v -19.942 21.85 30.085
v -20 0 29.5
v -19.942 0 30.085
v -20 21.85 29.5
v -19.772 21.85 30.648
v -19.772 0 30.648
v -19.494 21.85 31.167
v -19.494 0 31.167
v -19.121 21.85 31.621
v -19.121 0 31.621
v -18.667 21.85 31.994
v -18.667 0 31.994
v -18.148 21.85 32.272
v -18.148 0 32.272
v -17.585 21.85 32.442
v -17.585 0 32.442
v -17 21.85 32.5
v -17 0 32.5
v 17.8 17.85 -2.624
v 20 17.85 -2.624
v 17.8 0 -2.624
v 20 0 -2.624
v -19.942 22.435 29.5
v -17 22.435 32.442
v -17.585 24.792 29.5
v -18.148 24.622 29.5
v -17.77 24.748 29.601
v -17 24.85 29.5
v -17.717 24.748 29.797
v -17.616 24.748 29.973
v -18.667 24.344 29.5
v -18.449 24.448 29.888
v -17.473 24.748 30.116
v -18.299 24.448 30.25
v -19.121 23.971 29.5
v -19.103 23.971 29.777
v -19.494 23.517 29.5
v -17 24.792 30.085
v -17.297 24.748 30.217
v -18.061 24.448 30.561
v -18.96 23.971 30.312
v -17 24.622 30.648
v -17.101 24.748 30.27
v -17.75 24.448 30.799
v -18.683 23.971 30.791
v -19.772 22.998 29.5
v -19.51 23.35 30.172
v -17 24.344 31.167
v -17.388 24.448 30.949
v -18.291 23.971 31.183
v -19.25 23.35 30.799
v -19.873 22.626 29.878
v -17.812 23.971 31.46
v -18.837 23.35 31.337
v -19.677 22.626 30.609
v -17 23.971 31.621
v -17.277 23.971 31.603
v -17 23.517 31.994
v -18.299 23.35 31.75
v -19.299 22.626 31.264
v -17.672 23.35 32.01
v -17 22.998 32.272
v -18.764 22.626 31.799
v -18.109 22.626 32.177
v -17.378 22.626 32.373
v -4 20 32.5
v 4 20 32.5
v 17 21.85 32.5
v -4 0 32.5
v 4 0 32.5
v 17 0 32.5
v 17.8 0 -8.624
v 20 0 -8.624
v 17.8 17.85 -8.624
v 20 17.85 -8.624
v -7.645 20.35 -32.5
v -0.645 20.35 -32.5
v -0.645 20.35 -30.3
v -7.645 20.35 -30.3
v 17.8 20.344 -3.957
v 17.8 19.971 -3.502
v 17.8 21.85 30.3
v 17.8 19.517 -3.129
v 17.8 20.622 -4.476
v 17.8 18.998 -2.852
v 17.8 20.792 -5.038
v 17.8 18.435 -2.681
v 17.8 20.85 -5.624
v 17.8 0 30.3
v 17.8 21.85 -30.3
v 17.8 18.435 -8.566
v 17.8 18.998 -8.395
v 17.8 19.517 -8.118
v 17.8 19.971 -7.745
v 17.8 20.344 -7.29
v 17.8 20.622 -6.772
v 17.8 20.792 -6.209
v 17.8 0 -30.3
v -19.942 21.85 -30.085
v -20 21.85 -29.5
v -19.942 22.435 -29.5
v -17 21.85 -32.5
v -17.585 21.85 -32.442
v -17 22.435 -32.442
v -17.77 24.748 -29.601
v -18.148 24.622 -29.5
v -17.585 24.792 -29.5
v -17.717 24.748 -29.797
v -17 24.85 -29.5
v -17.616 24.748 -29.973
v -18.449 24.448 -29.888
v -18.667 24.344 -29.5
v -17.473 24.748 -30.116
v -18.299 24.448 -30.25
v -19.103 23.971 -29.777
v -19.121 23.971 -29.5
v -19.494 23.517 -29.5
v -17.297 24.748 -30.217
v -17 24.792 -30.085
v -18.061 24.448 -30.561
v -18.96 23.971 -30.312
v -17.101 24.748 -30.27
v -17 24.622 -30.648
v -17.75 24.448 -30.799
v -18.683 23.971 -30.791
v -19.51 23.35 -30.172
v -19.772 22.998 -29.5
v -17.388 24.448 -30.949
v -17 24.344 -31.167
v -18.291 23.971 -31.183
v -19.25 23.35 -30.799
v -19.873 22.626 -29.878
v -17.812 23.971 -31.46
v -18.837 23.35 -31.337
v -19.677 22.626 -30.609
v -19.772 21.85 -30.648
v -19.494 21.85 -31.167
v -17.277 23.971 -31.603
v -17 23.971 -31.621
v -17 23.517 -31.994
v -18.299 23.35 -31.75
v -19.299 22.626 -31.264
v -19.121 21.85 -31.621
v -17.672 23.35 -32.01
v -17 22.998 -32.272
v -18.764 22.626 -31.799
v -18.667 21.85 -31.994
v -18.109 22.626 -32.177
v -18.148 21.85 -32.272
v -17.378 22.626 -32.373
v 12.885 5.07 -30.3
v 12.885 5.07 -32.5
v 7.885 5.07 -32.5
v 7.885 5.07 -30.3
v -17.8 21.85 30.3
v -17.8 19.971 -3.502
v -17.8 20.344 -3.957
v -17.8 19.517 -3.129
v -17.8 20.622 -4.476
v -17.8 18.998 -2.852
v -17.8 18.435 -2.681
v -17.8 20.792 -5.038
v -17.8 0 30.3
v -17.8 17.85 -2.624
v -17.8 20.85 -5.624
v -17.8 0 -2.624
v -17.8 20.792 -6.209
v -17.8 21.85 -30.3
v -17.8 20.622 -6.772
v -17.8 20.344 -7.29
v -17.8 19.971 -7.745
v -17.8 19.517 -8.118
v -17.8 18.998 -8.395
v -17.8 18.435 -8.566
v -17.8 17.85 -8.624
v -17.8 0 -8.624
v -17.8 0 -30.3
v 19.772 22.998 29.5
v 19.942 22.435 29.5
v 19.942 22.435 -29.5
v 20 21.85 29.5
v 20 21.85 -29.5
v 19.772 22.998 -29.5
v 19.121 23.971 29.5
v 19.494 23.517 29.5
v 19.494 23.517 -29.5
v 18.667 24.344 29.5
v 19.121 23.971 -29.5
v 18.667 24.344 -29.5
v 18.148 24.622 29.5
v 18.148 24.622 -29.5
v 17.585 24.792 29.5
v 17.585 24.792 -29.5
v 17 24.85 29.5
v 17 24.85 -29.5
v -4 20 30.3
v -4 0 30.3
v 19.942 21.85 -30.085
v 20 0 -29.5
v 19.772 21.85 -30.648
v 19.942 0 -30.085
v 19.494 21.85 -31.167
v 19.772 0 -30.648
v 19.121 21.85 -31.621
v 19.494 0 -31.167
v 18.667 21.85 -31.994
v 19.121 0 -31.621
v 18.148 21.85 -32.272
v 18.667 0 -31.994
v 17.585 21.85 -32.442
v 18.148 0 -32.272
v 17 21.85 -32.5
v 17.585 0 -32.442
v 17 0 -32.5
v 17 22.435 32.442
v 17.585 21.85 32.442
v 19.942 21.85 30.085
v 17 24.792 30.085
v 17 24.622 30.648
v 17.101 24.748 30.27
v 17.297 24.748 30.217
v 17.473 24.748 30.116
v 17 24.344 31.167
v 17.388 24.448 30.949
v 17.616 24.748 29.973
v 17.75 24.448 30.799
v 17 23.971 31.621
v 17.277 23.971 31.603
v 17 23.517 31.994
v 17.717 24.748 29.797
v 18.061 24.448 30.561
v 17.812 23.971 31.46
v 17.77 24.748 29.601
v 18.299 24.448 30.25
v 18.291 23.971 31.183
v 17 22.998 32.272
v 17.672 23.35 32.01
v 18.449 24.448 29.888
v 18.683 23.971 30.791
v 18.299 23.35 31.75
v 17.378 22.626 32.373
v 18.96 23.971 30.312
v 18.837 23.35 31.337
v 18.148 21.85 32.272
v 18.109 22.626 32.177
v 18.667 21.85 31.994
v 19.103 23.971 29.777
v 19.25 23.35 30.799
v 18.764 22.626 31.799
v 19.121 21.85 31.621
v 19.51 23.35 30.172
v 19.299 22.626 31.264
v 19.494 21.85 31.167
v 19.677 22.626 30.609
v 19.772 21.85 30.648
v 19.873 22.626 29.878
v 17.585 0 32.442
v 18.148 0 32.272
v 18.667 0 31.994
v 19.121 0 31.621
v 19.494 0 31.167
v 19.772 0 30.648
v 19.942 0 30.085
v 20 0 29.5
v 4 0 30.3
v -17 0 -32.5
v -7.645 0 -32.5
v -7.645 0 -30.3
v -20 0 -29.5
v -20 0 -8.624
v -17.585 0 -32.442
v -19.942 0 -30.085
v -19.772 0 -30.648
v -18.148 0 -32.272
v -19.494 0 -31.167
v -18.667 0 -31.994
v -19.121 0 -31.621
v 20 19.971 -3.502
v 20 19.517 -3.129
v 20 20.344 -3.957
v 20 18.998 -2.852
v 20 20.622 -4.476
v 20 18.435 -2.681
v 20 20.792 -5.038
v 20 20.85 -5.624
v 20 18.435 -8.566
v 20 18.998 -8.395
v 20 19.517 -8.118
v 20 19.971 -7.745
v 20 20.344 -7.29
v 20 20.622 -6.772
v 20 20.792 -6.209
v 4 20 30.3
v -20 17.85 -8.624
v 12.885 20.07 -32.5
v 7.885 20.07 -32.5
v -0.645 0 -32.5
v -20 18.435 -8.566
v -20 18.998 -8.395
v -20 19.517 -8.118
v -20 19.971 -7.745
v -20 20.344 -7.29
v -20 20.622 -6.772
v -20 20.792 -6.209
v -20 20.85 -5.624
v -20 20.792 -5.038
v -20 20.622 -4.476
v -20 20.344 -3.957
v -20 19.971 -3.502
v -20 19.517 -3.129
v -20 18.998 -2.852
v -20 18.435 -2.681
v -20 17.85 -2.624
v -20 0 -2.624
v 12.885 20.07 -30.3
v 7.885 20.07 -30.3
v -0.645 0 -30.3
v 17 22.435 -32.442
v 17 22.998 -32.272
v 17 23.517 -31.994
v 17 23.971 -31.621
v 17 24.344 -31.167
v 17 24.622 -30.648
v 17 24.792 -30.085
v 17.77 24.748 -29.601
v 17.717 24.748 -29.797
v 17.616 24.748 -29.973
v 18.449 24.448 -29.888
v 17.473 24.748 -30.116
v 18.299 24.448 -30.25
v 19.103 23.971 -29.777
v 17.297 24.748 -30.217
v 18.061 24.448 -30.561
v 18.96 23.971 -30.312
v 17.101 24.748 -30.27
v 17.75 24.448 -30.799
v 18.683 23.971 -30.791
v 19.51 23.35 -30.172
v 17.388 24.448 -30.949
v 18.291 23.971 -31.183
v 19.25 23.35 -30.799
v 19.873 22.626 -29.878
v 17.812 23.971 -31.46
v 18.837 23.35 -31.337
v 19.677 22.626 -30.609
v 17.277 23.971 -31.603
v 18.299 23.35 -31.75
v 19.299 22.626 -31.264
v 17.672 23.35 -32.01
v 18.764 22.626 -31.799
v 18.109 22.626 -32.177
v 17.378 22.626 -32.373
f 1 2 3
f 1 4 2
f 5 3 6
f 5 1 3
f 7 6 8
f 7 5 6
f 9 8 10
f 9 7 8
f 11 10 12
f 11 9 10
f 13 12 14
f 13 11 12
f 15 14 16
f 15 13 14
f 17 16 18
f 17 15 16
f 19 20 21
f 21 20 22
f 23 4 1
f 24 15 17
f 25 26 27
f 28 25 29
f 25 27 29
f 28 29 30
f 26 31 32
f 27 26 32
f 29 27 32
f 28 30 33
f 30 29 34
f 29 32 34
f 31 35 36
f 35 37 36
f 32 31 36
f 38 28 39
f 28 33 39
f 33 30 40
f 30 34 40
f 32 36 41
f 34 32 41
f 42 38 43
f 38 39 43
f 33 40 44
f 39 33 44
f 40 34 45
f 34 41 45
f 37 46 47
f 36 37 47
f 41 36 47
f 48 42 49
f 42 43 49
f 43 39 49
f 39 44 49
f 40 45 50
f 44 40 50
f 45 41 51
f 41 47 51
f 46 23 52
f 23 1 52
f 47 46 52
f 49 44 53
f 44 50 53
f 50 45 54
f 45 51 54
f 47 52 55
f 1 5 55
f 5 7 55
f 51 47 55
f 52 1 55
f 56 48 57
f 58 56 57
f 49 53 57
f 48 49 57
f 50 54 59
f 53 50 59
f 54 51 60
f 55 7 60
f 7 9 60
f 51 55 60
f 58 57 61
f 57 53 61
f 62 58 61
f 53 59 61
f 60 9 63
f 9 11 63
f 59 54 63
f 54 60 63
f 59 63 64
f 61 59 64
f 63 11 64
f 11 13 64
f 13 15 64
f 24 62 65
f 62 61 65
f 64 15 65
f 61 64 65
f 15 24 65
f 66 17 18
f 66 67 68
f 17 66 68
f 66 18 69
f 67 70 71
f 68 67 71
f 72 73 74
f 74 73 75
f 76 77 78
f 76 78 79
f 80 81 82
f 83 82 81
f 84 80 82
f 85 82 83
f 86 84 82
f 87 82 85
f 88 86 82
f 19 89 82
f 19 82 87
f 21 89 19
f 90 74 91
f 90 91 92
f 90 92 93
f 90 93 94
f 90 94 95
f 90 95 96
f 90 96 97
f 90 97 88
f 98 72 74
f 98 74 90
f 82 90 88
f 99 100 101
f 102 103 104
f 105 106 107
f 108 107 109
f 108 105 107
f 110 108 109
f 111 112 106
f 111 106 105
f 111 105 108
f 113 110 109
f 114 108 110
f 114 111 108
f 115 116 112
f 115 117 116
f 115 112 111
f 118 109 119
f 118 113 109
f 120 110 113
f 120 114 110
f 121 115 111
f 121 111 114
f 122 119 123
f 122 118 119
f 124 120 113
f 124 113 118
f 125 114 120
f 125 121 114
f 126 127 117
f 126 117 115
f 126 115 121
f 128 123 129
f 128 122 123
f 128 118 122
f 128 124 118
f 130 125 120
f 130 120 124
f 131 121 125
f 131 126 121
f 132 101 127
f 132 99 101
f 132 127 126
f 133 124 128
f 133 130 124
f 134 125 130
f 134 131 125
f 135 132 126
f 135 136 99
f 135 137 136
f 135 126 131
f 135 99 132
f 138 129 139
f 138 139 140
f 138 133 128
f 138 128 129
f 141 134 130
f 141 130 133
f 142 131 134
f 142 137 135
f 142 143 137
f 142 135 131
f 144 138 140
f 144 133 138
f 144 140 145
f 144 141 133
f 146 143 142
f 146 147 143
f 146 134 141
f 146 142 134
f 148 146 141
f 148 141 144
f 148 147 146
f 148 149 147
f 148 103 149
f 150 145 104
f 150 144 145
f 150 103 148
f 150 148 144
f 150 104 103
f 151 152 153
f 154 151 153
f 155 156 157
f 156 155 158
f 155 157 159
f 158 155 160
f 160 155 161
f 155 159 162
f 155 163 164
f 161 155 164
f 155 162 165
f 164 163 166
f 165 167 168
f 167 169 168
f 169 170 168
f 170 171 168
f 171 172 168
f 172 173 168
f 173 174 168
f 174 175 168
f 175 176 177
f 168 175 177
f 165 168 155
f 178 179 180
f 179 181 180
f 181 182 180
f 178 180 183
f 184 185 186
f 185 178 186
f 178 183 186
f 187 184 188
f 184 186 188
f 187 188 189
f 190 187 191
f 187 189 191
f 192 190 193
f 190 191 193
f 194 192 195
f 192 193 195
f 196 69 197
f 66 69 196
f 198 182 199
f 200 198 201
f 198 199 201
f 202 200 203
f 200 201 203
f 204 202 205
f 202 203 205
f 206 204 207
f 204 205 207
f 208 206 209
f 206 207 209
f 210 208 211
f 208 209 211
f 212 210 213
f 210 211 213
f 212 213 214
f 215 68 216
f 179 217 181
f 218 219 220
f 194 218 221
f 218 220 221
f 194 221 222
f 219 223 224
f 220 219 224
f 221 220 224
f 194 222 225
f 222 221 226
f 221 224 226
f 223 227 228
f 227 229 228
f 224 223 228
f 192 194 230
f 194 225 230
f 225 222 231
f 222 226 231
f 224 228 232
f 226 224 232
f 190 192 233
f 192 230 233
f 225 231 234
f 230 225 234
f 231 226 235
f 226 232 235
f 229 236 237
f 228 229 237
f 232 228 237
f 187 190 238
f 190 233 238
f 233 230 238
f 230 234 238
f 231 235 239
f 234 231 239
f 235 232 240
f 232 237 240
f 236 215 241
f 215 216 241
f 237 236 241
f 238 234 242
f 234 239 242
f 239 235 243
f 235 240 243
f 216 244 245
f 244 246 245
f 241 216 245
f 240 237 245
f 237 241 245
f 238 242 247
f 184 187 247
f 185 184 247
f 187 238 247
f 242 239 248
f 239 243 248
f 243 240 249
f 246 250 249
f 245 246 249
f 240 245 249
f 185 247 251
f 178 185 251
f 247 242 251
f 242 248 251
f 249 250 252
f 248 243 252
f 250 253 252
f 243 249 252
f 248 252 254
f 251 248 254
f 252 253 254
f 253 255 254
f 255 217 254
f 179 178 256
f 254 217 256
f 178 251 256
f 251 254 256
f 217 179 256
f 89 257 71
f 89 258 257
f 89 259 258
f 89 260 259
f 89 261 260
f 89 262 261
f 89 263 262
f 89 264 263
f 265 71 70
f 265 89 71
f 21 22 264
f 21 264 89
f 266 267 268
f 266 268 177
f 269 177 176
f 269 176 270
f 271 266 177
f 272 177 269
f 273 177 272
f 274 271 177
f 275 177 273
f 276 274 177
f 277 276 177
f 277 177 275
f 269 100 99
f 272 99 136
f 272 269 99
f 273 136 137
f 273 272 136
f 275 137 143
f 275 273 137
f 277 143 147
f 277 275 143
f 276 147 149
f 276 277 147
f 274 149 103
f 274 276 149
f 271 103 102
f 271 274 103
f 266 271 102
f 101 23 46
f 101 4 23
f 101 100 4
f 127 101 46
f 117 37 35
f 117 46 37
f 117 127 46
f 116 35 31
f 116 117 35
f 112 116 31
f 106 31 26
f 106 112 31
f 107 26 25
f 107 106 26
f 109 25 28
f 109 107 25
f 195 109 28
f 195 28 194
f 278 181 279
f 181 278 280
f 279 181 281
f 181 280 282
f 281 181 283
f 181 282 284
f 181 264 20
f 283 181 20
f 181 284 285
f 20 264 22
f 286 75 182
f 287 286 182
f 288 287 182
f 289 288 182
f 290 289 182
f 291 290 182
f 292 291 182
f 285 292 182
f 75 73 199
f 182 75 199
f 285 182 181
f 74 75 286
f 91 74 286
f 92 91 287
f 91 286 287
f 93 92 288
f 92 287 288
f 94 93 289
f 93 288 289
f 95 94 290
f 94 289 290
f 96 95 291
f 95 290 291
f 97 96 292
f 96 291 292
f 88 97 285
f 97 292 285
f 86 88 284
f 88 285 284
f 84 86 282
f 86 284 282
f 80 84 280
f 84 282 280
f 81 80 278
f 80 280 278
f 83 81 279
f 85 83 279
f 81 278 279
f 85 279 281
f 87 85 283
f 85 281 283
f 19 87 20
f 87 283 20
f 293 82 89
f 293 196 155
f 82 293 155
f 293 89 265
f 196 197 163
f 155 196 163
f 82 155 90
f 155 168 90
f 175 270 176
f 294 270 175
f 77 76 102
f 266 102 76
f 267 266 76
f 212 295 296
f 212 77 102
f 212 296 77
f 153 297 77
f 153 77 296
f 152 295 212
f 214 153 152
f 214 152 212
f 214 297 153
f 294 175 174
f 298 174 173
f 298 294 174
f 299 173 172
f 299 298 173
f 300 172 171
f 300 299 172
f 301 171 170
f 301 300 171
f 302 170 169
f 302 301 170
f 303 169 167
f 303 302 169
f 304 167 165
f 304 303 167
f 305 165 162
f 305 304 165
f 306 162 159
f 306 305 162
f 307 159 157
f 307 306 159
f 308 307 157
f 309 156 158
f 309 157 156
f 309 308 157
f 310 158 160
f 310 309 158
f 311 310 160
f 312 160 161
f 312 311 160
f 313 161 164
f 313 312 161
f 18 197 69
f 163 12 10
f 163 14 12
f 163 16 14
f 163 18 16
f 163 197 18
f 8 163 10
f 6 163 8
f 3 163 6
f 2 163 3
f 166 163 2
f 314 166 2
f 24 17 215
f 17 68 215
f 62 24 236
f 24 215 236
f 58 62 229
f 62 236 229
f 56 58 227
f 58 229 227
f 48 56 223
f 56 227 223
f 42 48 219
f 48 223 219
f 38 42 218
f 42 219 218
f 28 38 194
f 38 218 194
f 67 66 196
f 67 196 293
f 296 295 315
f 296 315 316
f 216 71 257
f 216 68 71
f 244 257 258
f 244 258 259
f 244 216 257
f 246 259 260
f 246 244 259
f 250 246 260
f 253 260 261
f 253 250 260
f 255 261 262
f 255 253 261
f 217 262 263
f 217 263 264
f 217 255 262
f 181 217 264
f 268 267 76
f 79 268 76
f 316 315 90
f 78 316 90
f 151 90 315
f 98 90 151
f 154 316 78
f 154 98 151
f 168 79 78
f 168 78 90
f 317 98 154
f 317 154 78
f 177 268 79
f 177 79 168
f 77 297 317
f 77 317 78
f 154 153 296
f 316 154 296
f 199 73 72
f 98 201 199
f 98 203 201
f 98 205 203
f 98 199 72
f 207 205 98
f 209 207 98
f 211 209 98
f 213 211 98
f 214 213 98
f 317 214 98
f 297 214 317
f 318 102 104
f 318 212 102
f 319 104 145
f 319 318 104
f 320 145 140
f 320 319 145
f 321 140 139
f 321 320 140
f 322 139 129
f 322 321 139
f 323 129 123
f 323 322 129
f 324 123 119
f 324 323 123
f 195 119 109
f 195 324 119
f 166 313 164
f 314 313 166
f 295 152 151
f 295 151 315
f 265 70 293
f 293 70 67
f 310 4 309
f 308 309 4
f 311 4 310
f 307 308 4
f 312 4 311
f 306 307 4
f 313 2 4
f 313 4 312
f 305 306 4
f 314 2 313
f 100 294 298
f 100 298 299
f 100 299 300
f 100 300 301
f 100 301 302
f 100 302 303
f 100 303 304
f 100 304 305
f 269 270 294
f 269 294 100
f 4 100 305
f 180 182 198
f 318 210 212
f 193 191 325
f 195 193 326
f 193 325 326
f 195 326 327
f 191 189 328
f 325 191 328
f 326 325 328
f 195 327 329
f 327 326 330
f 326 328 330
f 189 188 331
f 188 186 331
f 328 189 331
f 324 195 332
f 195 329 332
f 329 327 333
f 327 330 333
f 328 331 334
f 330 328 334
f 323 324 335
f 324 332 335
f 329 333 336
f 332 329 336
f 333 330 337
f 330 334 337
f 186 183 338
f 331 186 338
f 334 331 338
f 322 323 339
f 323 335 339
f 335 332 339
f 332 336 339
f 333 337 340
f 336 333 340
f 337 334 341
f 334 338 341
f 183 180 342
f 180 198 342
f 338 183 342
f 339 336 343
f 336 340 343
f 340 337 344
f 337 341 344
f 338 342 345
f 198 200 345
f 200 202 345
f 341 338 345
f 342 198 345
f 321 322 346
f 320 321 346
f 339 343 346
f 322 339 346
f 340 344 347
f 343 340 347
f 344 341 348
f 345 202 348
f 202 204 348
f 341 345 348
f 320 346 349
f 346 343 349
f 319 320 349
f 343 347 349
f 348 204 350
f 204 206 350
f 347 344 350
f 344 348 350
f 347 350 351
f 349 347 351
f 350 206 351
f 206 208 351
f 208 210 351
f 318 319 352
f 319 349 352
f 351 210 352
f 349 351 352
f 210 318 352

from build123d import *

# Parameters (mm, degrees)
SKETCH2_W           = 40
SKETCH2_H           = 65
SKETCH2_W_2         = 35.6
SKETCH2_H_2         = 60.6
BOSS_EXTRUDE1_DEPTH = 21.85
CUT_EXTRUDE1_DEPTH  = 37.8
SKETCH10_W          = 5
SKETCH10_H          = 15
SKETCH10_W_2        = 7
SKETCH10_H_2        = 20.35
CUT_EXTRUDE2_DEPTH  = 2.2
SKETCH11_W          = 8
SKETCH11_H          = 20
CUT_EXTRUDE3_DEPTH  = 2.2
SKETCH8_W           = 40
SKETCH8_H           = 65
BOSS_EXTRUDE2_DEPTH = 3
FILLET1_R           = 3


with BuildPart() as part:
    # Sketch2 → Boss-Extrude1 (new body)
    with BuildSketch(Plane(origin=(0, 0, 0), x_dir=(-1, 0, 0), z_dir=(0, -1, 0))):
        Rectangle(SKETCH2_W, SKETCH2_H)
        Rectangle(SKETCH2_W_2, SKETCH2_H_2, mode=Mode.SUBTRACT)
    extrude(amount=-BOSS_EXTRUDE1_DEPTH)

    # Sketch9 → Cut-Extrude1 (cut)
    with BuildSketch(Plane(origin=(20, 0, 0), x_dir=(0, 0, -1), z_dir=(1, 0, 0))):
        with BuildLine():
            Line((2.623584384, 17.85), (2.623584384, 0))
            Line((2.623584384, 0), (8.623584384, 0))
            Line((8.623584384, 0), (8.623584384, 17.85))
            ThreePointArc((8.623584384, 17.85), (5.623584384, 20.85), (2.623584384, 17.85))
        make_face()
    cut_extrude1 = extrude(amount=-CUT_EXTRUDE1_DEPTH, mode=Mode.SUBTRACT)

    # Mirror1: Cut-Extrude1 across plane
    add(cut_extrude1.mirror(Plane(origin=(0, 0, 0), x_dir=(0, 0, 1), z_dir=(1, 0, 0))), mode=Mode.SUBTRACT)

    # Sketch10 → Cut-Extrude2 (cut)
    with BuildSketch(Plane(origin=(0, 0, -32.5), x_dir=(-1, 0, 0), z_dir=(0, 0, -1))):
        with Locations((-10.385, 12.57)):
            Rectangle(SKETCH10_W, SKETCH10_H)
        with Locations((4.145, 10.175)):
            Rectangle(SKETCH10_W_2, SKETCH10_H_2)
    extrude(amount=-CUT_EXTRUDE2_DEPTH, mode=Mode.SUBTRACT)

    # Sketch11 → Cut-Extrude3 (cut)
    with BuildSketch(Plane.XY.offset(32.5)):
        with Locations((0, 10)):
            Rectangle(SKETCH11_W, SKETCH11_H)
    extrude(amount=-CUT_EXTRUDE3_DEPTH, mode=Mode.SUBTRACT)

    # Sketch8 → Boss-Extrude2 (add)
    with BuildSketch(Plane(origin=(0, 21.85, 0), x_dir=(1, 0, 0), z_dir=(0, 1, 0))):
        Rectangle(SKETCH8_W, SKETCH8_H)
    extrude(amount=BOSS_EXTRUDE2_DEPTH)

    # Fillet1
    fillet1_edges = [part.edges().sort_by_distance(p)[0] for p in [
        (-20, 12.425, 32.5),
        (20, 12.425, 32.5),
        (20, 12.425, -32.5),
        (-20, 12.425, -32.5),
        (-20, 24.85, 0),
        (0, 24.85, 32.5),
        (20, 24.85, 0),
        (0, 24.85, -32.5),
    ]]
    fillet(fillet1_edges, radius=FILLET1_R)


solid = part.part
